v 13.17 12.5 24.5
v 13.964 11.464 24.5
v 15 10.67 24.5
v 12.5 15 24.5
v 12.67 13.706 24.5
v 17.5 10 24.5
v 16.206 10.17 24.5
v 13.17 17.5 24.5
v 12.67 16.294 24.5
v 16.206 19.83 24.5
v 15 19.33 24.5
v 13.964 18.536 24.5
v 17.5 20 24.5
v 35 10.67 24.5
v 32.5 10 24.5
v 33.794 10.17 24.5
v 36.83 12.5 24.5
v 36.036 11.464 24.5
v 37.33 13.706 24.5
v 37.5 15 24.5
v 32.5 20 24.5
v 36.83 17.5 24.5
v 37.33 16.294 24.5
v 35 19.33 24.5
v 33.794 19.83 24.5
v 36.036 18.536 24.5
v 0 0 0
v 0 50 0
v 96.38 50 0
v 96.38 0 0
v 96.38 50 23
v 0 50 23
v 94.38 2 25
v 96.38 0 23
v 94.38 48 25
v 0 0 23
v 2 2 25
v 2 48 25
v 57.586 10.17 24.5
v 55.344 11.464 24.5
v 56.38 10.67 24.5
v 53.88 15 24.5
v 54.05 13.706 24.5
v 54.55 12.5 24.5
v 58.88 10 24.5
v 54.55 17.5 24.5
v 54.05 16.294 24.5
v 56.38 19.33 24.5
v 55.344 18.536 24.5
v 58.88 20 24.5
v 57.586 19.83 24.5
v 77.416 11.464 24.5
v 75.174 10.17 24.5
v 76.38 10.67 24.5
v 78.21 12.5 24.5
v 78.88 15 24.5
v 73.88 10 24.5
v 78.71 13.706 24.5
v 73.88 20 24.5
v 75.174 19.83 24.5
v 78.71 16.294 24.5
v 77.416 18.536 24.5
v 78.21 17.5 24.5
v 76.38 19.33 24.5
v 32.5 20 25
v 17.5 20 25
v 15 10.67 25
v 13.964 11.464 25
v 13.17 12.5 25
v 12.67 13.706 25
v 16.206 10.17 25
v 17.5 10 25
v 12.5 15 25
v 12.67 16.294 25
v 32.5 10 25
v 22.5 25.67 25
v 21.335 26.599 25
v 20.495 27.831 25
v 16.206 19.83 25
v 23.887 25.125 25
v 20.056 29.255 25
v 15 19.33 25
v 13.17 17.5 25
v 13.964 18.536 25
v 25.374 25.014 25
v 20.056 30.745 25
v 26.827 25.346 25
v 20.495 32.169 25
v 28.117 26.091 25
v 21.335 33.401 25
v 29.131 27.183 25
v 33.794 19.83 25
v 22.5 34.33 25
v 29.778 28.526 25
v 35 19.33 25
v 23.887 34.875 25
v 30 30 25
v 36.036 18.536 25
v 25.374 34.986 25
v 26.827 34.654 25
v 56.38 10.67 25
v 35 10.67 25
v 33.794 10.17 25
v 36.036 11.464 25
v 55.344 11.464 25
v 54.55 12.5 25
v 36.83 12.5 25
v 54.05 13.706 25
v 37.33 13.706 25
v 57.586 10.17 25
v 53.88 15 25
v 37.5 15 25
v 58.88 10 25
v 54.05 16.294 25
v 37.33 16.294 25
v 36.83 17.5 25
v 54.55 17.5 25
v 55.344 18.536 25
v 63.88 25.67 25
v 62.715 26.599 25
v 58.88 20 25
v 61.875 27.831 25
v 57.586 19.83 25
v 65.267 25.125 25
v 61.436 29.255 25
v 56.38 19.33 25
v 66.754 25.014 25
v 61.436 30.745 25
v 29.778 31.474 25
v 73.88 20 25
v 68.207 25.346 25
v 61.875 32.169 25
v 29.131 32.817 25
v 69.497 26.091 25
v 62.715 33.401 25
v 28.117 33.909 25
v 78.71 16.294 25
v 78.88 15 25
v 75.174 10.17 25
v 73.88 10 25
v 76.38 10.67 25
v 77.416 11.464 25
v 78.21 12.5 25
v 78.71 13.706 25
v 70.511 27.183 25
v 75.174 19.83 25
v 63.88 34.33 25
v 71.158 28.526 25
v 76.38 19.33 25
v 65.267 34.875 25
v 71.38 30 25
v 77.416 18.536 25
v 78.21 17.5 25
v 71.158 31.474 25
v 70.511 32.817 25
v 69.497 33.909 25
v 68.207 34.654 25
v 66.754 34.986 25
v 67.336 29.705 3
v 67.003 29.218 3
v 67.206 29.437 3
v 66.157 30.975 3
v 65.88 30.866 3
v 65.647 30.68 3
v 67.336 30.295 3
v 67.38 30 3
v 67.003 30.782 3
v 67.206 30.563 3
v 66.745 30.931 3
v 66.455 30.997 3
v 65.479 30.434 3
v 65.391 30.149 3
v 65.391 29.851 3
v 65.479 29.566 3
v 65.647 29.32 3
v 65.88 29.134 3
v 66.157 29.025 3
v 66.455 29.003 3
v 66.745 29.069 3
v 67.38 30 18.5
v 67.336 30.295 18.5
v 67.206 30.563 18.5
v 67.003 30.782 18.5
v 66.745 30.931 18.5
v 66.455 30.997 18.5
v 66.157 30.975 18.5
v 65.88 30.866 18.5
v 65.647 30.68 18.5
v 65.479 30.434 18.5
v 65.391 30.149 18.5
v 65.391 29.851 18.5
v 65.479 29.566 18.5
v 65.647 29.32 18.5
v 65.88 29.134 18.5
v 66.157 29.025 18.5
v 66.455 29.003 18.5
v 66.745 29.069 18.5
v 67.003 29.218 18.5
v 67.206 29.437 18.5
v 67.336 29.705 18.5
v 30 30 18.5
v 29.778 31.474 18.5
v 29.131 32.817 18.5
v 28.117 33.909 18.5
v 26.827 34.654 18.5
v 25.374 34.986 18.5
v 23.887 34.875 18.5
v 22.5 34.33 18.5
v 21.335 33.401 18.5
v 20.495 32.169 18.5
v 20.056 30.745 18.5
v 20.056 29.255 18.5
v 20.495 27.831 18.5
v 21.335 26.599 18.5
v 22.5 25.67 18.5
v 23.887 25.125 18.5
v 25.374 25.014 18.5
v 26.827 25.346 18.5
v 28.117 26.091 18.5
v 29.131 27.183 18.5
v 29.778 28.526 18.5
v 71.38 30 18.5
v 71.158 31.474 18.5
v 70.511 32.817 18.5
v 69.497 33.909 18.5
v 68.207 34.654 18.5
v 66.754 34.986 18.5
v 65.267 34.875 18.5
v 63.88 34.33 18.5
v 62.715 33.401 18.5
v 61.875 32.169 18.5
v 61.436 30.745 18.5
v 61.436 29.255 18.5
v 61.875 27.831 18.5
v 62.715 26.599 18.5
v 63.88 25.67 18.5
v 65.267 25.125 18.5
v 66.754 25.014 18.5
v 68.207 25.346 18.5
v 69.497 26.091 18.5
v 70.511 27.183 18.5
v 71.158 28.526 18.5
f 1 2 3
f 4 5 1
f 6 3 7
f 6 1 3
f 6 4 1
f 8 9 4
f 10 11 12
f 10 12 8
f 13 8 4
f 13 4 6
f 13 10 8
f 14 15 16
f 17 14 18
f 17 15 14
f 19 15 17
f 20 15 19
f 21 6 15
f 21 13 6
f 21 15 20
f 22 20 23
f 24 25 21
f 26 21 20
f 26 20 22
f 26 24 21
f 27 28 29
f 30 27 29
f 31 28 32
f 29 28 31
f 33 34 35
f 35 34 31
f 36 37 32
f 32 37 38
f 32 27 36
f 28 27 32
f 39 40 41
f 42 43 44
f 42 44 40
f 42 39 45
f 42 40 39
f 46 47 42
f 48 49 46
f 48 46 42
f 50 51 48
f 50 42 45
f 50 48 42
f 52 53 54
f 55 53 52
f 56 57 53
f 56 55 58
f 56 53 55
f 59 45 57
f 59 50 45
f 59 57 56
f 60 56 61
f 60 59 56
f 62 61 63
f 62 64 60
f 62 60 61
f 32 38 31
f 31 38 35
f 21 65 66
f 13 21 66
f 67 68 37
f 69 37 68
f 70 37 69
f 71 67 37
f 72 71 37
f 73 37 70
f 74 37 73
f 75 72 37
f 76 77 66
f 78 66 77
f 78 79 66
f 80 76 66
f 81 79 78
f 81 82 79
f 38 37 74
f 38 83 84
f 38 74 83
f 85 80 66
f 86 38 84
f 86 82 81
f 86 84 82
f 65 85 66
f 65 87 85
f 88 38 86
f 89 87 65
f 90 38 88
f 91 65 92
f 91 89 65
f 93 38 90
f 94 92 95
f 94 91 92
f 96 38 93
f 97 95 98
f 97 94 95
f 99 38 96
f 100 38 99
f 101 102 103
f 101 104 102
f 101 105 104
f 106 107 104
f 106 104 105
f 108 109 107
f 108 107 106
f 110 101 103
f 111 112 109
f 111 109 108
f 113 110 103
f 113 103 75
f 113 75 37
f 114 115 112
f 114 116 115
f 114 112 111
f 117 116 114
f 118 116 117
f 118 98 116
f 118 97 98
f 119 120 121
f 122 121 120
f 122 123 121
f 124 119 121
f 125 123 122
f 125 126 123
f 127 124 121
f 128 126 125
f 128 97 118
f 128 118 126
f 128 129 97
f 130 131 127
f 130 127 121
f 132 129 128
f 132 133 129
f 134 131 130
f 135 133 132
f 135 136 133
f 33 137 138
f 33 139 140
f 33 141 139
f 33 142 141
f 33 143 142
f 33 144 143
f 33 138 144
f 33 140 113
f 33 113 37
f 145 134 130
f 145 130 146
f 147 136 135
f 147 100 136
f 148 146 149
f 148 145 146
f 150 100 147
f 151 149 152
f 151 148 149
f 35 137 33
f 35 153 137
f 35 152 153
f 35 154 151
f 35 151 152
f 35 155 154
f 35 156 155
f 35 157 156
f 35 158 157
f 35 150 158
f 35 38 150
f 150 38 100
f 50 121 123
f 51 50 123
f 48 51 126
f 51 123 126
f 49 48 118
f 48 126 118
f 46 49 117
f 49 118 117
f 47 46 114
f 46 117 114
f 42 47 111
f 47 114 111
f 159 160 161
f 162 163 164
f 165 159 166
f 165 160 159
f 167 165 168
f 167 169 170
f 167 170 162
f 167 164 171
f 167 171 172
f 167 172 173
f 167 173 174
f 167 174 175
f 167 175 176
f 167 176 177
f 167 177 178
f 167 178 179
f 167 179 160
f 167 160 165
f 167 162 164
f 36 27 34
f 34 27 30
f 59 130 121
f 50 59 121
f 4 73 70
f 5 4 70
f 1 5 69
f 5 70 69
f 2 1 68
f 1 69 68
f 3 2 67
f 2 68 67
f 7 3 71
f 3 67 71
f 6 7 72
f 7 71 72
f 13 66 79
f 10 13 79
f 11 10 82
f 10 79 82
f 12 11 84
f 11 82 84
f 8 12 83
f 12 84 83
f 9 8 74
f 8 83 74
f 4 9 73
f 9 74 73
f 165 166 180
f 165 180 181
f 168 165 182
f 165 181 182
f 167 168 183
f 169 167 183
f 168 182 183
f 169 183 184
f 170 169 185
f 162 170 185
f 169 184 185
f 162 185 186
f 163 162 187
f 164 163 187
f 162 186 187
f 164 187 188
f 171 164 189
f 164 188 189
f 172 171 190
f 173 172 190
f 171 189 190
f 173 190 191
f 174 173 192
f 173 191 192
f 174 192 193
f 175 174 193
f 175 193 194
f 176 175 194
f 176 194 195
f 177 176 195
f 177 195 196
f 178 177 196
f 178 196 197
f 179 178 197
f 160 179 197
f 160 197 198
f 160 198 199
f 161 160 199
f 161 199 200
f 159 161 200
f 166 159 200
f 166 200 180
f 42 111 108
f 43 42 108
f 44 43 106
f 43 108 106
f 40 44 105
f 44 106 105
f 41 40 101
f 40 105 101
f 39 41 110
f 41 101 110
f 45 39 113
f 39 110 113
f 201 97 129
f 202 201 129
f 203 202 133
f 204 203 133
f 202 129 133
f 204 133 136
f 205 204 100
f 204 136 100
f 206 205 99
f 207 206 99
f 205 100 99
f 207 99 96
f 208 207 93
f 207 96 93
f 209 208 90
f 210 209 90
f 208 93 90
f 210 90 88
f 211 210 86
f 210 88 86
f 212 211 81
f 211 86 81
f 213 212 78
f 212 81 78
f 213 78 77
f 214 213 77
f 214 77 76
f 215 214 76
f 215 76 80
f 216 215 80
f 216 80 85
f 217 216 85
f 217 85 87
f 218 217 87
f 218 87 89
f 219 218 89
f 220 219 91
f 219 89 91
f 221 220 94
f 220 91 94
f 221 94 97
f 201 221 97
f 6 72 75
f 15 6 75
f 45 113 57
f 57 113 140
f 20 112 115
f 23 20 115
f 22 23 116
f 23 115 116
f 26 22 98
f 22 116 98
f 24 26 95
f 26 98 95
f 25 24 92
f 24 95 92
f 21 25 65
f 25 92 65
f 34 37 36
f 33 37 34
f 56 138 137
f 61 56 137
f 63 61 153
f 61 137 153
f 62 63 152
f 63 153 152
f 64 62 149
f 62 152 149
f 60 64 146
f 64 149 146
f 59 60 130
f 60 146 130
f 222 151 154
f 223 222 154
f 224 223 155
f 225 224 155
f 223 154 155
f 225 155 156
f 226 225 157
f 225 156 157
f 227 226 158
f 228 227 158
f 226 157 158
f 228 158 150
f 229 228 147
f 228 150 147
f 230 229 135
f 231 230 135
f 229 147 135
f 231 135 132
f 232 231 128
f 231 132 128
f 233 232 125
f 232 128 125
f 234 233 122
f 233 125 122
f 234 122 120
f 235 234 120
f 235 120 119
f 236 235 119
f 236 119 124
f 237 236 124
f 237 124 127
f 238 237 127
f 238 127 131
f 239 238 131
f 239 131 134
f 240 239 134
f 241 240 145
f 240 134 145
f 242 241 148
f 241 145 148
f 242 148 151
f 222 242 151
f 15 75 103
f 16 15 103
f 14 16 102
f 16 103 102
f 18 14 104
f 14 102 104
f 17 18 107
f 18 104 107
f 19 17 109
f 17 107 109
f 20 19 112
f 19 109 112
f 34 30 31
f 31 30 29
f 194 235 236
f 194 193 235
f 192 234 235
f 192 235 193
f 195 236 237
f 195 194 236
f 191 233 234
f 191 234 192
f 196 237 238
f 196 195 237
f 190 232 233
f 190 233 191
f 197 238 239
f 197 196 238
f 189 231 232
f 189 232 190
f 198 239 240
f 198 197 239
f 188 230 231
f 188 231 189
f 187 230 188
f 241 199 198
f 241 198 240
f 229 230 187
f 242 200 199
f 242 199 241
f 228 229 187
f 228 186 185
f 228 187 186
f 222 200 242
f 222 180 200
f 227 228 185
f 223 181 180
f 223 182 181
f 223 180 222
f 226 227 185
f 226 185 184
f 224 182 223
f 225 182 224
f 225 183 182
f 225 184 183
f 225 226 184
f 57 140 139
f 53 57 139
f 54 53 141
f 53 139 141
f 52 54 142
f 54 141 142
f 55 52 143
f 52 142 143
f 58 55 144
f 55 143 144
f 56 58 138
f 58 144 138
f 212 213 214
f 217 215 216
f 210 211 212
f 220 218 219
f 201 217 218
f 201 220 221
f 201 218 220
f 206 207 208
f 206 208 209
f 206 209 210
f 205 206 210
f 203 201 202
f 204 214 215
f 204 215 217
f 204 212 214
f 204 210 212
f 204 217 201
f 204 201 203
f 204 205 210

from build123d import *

# Parameters (mm, degrees)
F0_W     = 96.38
F0_H     = 50
F1_DEPTH = 25
F2_R     = 5
F3_DEPTH = 6.5
F4_R     = 1
F5_DEPTH = 22
F6_SIZE  = 2
F8_DEPTH = 0.5


with BuildPart() as f1:
    # F0 (on Top) → F1 (new body)
    with BuildSketch(Plane.XY):
        with Locations((48.19, 25)):
            Rectangle(F0_W, F0_H)
    extrude(amount=F1_DEPTH)

    # F2 (on face) → F3 (cut)
    with BuildSketch(Plane.XY.offset(25)):
        with Locations((25, 30)):
            Circle(F2_R)
        with Locations((66.38, 30)):
            Circle(F2_R)
    extrude(amount=-F3_DEPTH, mode=Mode.SUBTRACT)

    # F4 (on face) → F5 (cut)
    with BuildSketch(Plane.XY.offset(25)):
        with Locations((66.38, 30)):
            Circle(F4_R)
    extrude(amount=-F5_DEPTH, mode=Mode.SUBTRACT)

    # F6
    f6_edges = [f1.edges().sort_by_distance(p)[0] for p in [
        (48.19, 0, 25),
        (96.38, 25, 25),
        (0, 25, 25),
        (48.19, 50, 25),
    ]]
    chamfer(f6_edges, length=F6_SIZE)

    # F7 (on face) → F8 (cut)
    with BuildSketch(Plane.XY.offset(25)):
        with BuildLine():
            Line((32.5, 20), (17.5, 20))
            ThreePointArc((17.5, 20), (13.964466, 18.535534), (12.5, 15))
            ThreePointArc((12.5, 15), (13.964466, 11.464466), (17.5, 10))
            Line((17.5, 10), (32.5, 10))
            ThreePointArc((32.5, 10), (36.035534, 11.464466), (37.5, 15))
            ThreePointArc((37.5, 15), (36.035534, 18.535534), (32.5, 20))
        make_face()
        with BuildLine():
            Line((73.88, 20), (58.88, 20))
            ThreePointArc((58.88, 20), (55.344466, 18.535534), (53.88, 15))
            ThreePointArc((53.88, 15), (55.344466, 11.464466), (58.88, 10))
            Line((58.88, 10), (73.88, 10))
            ThreePointArc((73.88, 10), (77.415534, 11.464466), (78.88, 15))
            ThreePointArc((78.88, 15), (77.415534, 18.535534), (73.88, 20))
        make_face()
    extrude(amount=-F8_DEPTH, mode=Mode.SUBTRACT)


solid = f1.part
